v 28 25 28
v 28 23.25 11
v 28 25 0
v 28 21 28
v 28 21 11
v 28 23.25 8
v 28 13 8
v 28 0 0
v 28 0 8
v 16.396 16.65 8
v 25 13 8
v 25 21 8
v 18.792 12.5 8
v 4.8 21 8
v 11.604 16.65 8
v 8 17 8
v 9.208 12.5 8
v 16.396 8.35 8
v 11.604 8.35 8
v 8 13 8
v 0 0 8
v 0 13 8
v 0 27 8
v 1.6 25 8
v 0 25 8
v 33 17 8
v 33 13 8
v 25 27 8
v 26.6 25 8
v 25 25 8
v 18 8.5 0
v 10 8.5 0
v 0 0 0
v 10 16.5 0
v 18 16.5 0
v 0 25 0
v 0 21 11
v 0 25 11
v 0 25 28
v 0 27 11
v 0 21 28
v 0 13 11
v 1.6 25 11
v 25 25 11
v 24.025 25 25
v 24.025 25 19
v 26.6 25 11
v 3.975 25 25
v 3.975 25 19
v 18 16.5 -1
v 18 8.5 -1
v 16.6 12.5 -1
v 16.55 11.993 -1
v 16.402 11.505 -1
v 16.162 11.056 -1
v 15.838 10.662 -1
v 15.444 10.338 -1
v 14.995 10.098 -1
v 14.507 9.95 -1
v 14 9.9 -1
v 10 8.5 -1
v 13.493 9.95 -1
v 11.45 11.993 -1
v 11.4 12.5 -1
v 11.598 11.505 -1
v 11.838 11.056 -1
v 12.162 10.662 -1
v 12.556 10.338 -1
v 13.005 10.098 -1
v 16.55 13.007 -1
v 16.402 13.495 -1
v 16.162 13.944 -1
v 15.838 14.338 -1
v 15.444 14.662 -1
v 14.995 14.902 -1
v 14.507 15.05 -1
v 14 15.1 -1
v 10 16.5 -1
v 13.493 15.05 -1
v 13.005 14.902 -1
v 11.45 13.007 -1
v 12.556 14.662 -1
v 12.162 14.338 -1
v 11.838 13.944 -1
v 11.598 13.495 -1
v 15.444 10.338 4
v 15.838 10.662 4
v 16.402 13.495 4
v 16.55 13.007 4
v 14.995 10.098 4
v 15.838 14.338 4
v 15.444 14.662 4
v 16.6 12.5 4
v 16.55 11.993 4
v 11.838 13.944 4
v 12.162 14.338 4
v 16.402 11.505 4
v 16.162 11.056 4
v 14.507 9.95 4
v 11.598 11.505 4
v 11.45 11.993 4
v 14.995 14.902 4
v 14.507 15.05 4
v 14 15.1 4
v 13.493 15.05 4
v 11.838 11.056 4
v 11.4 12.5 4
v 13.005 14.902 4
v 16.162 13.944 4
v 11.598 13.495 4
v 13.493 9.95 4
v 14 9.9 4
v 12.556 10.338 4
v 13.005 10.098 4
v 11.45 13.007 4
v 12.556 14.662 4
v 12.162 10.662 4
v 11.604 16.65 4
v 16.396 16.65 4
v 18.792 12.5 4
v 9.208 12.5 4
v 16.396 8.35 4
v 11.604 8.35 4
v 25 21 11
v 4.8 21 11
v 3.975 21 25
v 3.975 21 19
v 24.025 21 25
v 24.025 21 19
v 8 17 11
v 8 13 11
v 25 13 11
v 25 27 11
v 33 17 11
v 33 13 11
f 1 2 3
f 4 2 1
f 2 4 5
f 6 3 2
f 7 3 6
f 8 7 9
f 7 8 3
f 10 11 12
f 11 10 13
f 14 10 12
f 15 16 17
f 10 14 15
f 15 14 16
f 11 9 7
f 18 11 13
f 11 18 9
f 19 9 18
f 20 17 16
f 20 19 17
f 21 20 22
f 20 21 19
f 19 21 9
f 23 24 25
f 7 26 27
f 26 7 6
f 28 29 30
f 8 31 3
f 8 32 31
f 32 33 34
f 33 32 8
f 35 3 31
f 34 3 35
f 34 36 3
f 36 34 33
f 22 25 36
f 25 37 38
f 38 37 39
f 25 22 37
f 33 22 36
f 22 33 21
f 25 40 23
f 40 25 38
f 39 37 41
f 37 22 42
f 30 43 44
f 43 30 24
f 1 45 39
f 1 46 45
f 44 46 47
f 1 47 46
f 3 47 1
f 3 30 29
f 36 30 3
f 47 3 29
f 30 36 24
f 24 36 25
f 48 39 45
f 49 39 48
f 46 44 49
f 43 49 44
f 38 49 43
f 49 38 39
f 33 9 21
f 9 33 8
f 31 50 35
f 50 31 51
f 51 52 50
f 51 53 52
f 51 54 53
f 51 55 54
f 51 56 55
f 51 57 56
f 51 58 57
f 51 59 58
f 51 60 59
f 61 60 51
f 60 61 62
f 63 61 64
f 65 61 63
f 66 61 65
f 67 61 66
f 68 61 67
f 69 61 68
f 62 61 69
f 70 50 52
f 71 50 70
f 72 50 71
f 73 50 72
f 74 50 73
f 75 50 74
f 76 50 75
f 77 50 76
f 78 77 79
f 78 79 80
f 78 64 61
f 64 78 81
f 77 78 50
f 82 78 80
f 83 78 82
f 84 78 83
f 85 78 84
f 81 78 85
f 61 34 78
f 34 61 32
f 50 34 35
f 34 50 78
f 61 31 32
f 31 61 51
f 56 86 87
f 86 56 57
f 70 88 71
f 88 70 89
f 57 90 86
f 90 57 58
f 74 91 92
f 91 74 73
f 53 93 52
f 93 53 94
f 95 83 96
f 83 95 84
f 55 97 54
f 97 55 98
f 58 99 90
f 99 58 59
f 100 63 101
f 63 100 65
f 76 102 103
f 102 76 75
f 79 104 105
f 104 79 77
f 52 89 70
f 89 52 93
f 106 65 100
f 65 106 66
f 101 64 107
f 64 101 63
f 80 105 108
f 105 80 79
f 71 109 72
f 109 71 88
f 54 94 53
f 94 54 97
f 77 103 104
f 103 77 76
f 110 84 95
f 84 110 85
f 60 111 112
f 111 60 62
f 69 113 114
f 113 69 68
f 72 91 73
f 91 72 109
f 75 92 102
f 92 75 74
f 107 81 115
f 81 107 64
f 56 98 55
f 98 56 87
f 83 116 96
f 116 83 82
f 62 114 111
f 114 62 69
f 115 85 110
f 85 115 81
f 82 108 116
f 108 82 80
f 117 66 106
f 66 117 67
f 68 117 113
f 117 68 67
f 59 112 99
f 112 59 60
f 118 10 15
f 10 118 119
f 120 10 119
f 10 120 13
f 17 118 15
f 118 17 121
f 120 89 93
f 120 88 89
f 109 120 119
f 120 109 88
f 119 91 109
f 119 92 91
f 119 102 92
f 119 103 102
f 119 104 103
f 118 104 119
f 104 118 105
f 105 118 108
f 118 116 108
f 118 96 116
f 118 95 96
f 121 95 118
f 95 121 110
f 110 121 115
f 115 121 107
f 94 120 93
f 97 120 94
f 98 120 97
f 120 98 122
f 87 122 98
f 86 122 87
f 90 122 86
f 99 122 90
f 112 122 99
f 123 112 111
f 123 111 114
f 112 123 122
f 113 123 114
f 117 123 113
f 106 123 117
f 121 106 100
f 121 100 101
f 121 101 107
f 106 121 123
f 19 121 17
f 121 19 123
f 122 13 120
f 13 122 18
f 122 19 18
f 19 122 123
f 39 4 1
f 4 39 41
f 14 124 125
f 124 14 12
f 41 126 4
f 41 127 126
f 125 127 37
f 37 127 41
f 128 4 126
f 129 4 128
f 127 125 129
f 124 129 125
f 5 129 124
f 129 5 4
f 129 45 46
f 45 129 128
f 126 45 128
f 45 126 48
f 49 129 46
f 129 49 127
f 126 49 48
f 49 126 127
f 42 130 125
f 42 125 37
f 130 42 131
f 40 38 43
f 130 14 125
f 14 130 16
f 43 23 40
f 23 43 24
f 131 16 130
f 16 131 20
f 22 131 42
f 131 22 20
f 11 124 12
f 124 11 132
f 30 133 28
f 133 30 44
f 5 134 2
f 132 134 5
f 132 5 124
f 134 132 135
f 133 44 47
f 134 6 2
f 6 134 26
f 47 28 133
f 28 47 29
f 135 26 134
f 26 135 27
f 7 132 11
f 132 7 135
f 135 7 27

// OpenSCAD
// file: ../lib/slot_mount.scad
// ============================================================
// Slot Mount Base Module
// ============================================================
// Reusable foundation for all shelf mounts
// Provides slot tab, mounting surface, M5 hole, and nut pocket

include <../params.scad>

module slot_mount_base() {
    // Horizontal base that sits on top of shelf
    // Need enough width for: slot tab + walls around nut pocket + channel side walls
    // Increased width provides more robust walls on sides of velcro channel
    base_width = 28;  // mm, provides 10mm wall on each side of slot tab
    base_depth = mount_body_d;
    base_height = mount_body_h;

    difference() {
        union() {
            // Main horizontal base body
            translate([0, 0, 0])
                cube([base_width, base_depth, base_height]);

            // Slot tab (extends downward from bottom of base)
            translate([(base_width - slot_tab_width) / 2,
                      (base_depth - slot_tab_width) / 2,
                      -slot_tab_depth])
                cube([slot_tab_width, slot_tab_width, slot_tab_depth]);
        }

        // M5 screw clearance hole (through entire base)
        translate([base_width / 2, base_depth / 2, -slot_tab_depth - 1])
            cylinder(h = base_height + slot_tab_depth + 2, d = m5_screw_d, $fn = 32);

        // Hex nut pocket (from top, side-loading style)
        // Using cos(30) to convert across-flats to circumradius
        translate([base_width / 2, base_depth / 2, base_height - m5_nut_h])
            cylinder(h = m5_nut_h + 1,
                    d = (m5_nut_w + nut_pocket_tol) / cos(30),
                    $fn = 6);
    }
}

// Test render
slot_mount_base();
// file: ../params.scad
// ============================================================
// Ham Radio Go Kit — OpenSCAD Parameters
// ============================================================

// ============================================================
// SHELF SLOT — MEASURED (configurable for other shelves)
// ============================================================
slot_width = 8.1;           // mm, slot opening width — MEASURED on Vevor shelf
slot_spacing = 5.0;         // mm, rail width between slots
shelf_thickness = 1.5;      // mm, shelf material thickness
slot_tab_width = 8.0;       // mm, tab width (fits in 8.1mm slot)
slot_tab_depth = 1.0;       // mm, tab depth - just prevents rotation, allows washer clearance
slot_tab_engage = 2.0;      // mm, minimum engagement depth for retention

// ============================================================
// M5 HARDWARE
// ============================================================
m5_screw_d = 5.2;           // mm, clearance hole diameter
m5_nut_w = 8.0;             // mm, hex nut width across flats
m5_nut_h = 4.0;             // mm, hex nut height
m5_washer_od = 10.0;        // mm, washer OD - verify clears slot

// ============================================================
// TOLERANCES
// ============================================================
fit_clearance = 0.2;        // mm, slot tab fit clearance
nut_pocket_tol = 0.3;       // mm, nut pocket oversize for capture

// ============================================================
// VELCRO STRAP MOUNTS
// ============================================================
velcro_width = 19.05;       // mm, 0.75" velcro - standardize all straps
velcro_channel_clearance = 1.0;  // mm, channel oversize
mount_body_w = 25.0;        // mm
mount_body_d = 25.0;        // mm
mount_body_h = 8.0;         // mm, sets max gear height that can be strapped

// ============================================================
// PINEBOOK PRO — measure closed unit with calipers
// ============================================================
pbp_w = 280.0;              // mm, width
pbp_d = 192.0;              // mm, depth
pbp_h = 12.0;               // mm, closed lid thickness — MEASURE
pbp_clearance = 0.5;        // mm, fit clearance inside captures

// L-mount (front, x2)
l_arm_thickness = 4.0;      // mm, horizontal arm thickness
l_arm_length = 15.0;        // mm, how far arm extends over laptop top

// Corner mount (rear, x2)
corner_wall_thickness = 4.0;  // mm
corner_wall_h = 20.0;         // mm, should be > pbp_h + corner_arm_thickness
corner_arm_length = 15.0;     // mm, top retention arm extends over laptop
corner_arm_thickness = 4.0;   // mm

// ============================================================
// MFJ-939 BRACKETS — measure on physical unit
// ============================================================
mfj939_chassis_w = 0.0;        // mm, outside width — MEASURE
mfj939_side_screw_d = 3.5;     // mm, #6-32 clearance hole — VERIFY
mfj939_side_screw_spacing = 0.0; // mm, fore/aft spacing between screw holes on side panel — MEASURE
mfj939_screw_height = 0.0;     // mm, screw centerline height above shelf surface — MEASURE

// Bracket geometry
bracket_foot_d = 25.0;         // mm, horizontal foot depth on shelf
bracket_foot_h = 8.0;          // mm, horizontal foot thickness
bracket_arm_thickness = 4.0;   // mm, vertical arm thickness
// main file
// ============================================================
// Velcro Strap Mount
// ============================================================
// L-shaped mount with horizontal base (slot mount) and vertical arm
// Velcro passes through hole in vertical arm

include <../params.scad>
use <../lib/slot_mount.scad>

module velcro_mount() {
    // Calculate dimensions - must match slot_mount_base
    base_width = 28;  // mm, matches slot_mount_base
    base_depth = mount_body_d;
    base_height = mount_body_h;

    // Vertical arm dimensions
    arm_height = 20;  // mm, tall enough to support strapped equipment
    arm_thickness = 4;  // mm, thickness of vertical wall

    // Velcro channel dimensions
    channel_width = velcro_width + velcro_channel_clearance;
    channel_height = 6;  // mm, reduced for strength - just enough for velcro
    channel_radius = 1.5;  // mm, radius for smoothed corners

    union() {
        // Horizontal base with slot tab and nut pocket
        slot_mount_base();

        // Vertical arm at back edge
        difference() {
            // Solid vertical wall
            translate([0, base_depth - arm_thickness, base_height])
                cube([base_width, arm_thickness, arm_height]);

            // Velcro channel (horizontal slot through vertical arm)
            // Positioned closer to top for better lower wall strength
            translate([
                (base_width - channel_width) / 2,
                base_depth - arm_thickness - 1,
                base_height + arm_height - channel_height - 3  // 3mm from top
            ])
                cube([channel_width, arm_thickness + 2, channel_height]);

            // Add rounded corners on front and back edges of channel opening
            // These are subtractive cylinders positioned at the corners
            // Front left corner
            translate([
                (base_width - channel_width) / 2 + channel_radius,
                base_depth - arm_thickness,
                base_height + arm_height - channel_height - 3 + channel_radius
            ])
                rotate([90, 0, 0])
                    cylinder(h = arm_thickness, r = channel_radius, center = true, $fn = 16);

            // Front right corner
            translate([
                (base_width + channel_width) / 2 - channel_radius,
                base_depth - arm_thickness,
                base_height + arm_height - channel_height - 3 + channel_radius
            ])
                rotate([90, 0, 0])
                    cylinder(h = arm_thickness, r = channel_radius, center = true, $fn = 16);

            // Front left bottom corner
            translate([
                (base_width - channel_width) / 2 + channel_radius,
                base_depth - arm_thickness,
                base_height + arm_height - 3 - channel_radius
            ])
                rotate([90, 0, 0])
                    cylinder(h = arm_thickness, r = channel_radius, center = true, $fn = 16);

            // Front right bottom corner
            translate([
                (base_width + channel_width) / 2 - channel_radius,
                base_depth - arm_thickness,
                base_height + arm_height - 3 - channel_radius
            ])
                rotate([90, 0, 0])
                    cylinder(h = arm_thickness, r = channel_radius, center = true, $fn = 16);
        }

        // Diagonal support gussets on each side (on back of vertical arm)
        // These brace the vertical arm to the horizontal base
        gusset_depth = 8;  // mm, how far gusset extends back onto base
        gusset_height = 10;  // mm, height of triangular support up vertical arm
        gusset_thickness = 3;  // mm, thickness of gusset

        // Left gusset - triangular brace on left side, back of vertical arm
        translate([0, base_depth - arm_thickness - gusset_depth, base_height])
            rotate([0, 0, 0])
                linear_extrude(height = gusset_thickness)
                    polygon([
                        [0, 0],
                        [gusset_depth, 0],
                        [gusset_depth, arm_thickness],
                        [0, arm_thickness + gusset_height]
                    ]);

        // Right gusset - triangular brace on right side, back of vertical arm
        translate([base_width - gusset_thickness, base_depth - arm_thickness - gusset_depth, base_height])
            rotate([0, 0, 0])
                linear_extrude(height = gusset_thickness)
                    polygon([
                        [0, 0],
                        [gusset_depth, 0],
                        [gusset_depth, arm_thickness],
                        [0, arm_thickness + gusset_height]
                    ]);
    }
}

// Render single mount for preview
velcro_mount();

// Uncomment to render mirrored pair for printing
// velcro_mount();
// translate([40, 0, 0])
//     mirror([1, 0, 0])
//         velcro_mount();
